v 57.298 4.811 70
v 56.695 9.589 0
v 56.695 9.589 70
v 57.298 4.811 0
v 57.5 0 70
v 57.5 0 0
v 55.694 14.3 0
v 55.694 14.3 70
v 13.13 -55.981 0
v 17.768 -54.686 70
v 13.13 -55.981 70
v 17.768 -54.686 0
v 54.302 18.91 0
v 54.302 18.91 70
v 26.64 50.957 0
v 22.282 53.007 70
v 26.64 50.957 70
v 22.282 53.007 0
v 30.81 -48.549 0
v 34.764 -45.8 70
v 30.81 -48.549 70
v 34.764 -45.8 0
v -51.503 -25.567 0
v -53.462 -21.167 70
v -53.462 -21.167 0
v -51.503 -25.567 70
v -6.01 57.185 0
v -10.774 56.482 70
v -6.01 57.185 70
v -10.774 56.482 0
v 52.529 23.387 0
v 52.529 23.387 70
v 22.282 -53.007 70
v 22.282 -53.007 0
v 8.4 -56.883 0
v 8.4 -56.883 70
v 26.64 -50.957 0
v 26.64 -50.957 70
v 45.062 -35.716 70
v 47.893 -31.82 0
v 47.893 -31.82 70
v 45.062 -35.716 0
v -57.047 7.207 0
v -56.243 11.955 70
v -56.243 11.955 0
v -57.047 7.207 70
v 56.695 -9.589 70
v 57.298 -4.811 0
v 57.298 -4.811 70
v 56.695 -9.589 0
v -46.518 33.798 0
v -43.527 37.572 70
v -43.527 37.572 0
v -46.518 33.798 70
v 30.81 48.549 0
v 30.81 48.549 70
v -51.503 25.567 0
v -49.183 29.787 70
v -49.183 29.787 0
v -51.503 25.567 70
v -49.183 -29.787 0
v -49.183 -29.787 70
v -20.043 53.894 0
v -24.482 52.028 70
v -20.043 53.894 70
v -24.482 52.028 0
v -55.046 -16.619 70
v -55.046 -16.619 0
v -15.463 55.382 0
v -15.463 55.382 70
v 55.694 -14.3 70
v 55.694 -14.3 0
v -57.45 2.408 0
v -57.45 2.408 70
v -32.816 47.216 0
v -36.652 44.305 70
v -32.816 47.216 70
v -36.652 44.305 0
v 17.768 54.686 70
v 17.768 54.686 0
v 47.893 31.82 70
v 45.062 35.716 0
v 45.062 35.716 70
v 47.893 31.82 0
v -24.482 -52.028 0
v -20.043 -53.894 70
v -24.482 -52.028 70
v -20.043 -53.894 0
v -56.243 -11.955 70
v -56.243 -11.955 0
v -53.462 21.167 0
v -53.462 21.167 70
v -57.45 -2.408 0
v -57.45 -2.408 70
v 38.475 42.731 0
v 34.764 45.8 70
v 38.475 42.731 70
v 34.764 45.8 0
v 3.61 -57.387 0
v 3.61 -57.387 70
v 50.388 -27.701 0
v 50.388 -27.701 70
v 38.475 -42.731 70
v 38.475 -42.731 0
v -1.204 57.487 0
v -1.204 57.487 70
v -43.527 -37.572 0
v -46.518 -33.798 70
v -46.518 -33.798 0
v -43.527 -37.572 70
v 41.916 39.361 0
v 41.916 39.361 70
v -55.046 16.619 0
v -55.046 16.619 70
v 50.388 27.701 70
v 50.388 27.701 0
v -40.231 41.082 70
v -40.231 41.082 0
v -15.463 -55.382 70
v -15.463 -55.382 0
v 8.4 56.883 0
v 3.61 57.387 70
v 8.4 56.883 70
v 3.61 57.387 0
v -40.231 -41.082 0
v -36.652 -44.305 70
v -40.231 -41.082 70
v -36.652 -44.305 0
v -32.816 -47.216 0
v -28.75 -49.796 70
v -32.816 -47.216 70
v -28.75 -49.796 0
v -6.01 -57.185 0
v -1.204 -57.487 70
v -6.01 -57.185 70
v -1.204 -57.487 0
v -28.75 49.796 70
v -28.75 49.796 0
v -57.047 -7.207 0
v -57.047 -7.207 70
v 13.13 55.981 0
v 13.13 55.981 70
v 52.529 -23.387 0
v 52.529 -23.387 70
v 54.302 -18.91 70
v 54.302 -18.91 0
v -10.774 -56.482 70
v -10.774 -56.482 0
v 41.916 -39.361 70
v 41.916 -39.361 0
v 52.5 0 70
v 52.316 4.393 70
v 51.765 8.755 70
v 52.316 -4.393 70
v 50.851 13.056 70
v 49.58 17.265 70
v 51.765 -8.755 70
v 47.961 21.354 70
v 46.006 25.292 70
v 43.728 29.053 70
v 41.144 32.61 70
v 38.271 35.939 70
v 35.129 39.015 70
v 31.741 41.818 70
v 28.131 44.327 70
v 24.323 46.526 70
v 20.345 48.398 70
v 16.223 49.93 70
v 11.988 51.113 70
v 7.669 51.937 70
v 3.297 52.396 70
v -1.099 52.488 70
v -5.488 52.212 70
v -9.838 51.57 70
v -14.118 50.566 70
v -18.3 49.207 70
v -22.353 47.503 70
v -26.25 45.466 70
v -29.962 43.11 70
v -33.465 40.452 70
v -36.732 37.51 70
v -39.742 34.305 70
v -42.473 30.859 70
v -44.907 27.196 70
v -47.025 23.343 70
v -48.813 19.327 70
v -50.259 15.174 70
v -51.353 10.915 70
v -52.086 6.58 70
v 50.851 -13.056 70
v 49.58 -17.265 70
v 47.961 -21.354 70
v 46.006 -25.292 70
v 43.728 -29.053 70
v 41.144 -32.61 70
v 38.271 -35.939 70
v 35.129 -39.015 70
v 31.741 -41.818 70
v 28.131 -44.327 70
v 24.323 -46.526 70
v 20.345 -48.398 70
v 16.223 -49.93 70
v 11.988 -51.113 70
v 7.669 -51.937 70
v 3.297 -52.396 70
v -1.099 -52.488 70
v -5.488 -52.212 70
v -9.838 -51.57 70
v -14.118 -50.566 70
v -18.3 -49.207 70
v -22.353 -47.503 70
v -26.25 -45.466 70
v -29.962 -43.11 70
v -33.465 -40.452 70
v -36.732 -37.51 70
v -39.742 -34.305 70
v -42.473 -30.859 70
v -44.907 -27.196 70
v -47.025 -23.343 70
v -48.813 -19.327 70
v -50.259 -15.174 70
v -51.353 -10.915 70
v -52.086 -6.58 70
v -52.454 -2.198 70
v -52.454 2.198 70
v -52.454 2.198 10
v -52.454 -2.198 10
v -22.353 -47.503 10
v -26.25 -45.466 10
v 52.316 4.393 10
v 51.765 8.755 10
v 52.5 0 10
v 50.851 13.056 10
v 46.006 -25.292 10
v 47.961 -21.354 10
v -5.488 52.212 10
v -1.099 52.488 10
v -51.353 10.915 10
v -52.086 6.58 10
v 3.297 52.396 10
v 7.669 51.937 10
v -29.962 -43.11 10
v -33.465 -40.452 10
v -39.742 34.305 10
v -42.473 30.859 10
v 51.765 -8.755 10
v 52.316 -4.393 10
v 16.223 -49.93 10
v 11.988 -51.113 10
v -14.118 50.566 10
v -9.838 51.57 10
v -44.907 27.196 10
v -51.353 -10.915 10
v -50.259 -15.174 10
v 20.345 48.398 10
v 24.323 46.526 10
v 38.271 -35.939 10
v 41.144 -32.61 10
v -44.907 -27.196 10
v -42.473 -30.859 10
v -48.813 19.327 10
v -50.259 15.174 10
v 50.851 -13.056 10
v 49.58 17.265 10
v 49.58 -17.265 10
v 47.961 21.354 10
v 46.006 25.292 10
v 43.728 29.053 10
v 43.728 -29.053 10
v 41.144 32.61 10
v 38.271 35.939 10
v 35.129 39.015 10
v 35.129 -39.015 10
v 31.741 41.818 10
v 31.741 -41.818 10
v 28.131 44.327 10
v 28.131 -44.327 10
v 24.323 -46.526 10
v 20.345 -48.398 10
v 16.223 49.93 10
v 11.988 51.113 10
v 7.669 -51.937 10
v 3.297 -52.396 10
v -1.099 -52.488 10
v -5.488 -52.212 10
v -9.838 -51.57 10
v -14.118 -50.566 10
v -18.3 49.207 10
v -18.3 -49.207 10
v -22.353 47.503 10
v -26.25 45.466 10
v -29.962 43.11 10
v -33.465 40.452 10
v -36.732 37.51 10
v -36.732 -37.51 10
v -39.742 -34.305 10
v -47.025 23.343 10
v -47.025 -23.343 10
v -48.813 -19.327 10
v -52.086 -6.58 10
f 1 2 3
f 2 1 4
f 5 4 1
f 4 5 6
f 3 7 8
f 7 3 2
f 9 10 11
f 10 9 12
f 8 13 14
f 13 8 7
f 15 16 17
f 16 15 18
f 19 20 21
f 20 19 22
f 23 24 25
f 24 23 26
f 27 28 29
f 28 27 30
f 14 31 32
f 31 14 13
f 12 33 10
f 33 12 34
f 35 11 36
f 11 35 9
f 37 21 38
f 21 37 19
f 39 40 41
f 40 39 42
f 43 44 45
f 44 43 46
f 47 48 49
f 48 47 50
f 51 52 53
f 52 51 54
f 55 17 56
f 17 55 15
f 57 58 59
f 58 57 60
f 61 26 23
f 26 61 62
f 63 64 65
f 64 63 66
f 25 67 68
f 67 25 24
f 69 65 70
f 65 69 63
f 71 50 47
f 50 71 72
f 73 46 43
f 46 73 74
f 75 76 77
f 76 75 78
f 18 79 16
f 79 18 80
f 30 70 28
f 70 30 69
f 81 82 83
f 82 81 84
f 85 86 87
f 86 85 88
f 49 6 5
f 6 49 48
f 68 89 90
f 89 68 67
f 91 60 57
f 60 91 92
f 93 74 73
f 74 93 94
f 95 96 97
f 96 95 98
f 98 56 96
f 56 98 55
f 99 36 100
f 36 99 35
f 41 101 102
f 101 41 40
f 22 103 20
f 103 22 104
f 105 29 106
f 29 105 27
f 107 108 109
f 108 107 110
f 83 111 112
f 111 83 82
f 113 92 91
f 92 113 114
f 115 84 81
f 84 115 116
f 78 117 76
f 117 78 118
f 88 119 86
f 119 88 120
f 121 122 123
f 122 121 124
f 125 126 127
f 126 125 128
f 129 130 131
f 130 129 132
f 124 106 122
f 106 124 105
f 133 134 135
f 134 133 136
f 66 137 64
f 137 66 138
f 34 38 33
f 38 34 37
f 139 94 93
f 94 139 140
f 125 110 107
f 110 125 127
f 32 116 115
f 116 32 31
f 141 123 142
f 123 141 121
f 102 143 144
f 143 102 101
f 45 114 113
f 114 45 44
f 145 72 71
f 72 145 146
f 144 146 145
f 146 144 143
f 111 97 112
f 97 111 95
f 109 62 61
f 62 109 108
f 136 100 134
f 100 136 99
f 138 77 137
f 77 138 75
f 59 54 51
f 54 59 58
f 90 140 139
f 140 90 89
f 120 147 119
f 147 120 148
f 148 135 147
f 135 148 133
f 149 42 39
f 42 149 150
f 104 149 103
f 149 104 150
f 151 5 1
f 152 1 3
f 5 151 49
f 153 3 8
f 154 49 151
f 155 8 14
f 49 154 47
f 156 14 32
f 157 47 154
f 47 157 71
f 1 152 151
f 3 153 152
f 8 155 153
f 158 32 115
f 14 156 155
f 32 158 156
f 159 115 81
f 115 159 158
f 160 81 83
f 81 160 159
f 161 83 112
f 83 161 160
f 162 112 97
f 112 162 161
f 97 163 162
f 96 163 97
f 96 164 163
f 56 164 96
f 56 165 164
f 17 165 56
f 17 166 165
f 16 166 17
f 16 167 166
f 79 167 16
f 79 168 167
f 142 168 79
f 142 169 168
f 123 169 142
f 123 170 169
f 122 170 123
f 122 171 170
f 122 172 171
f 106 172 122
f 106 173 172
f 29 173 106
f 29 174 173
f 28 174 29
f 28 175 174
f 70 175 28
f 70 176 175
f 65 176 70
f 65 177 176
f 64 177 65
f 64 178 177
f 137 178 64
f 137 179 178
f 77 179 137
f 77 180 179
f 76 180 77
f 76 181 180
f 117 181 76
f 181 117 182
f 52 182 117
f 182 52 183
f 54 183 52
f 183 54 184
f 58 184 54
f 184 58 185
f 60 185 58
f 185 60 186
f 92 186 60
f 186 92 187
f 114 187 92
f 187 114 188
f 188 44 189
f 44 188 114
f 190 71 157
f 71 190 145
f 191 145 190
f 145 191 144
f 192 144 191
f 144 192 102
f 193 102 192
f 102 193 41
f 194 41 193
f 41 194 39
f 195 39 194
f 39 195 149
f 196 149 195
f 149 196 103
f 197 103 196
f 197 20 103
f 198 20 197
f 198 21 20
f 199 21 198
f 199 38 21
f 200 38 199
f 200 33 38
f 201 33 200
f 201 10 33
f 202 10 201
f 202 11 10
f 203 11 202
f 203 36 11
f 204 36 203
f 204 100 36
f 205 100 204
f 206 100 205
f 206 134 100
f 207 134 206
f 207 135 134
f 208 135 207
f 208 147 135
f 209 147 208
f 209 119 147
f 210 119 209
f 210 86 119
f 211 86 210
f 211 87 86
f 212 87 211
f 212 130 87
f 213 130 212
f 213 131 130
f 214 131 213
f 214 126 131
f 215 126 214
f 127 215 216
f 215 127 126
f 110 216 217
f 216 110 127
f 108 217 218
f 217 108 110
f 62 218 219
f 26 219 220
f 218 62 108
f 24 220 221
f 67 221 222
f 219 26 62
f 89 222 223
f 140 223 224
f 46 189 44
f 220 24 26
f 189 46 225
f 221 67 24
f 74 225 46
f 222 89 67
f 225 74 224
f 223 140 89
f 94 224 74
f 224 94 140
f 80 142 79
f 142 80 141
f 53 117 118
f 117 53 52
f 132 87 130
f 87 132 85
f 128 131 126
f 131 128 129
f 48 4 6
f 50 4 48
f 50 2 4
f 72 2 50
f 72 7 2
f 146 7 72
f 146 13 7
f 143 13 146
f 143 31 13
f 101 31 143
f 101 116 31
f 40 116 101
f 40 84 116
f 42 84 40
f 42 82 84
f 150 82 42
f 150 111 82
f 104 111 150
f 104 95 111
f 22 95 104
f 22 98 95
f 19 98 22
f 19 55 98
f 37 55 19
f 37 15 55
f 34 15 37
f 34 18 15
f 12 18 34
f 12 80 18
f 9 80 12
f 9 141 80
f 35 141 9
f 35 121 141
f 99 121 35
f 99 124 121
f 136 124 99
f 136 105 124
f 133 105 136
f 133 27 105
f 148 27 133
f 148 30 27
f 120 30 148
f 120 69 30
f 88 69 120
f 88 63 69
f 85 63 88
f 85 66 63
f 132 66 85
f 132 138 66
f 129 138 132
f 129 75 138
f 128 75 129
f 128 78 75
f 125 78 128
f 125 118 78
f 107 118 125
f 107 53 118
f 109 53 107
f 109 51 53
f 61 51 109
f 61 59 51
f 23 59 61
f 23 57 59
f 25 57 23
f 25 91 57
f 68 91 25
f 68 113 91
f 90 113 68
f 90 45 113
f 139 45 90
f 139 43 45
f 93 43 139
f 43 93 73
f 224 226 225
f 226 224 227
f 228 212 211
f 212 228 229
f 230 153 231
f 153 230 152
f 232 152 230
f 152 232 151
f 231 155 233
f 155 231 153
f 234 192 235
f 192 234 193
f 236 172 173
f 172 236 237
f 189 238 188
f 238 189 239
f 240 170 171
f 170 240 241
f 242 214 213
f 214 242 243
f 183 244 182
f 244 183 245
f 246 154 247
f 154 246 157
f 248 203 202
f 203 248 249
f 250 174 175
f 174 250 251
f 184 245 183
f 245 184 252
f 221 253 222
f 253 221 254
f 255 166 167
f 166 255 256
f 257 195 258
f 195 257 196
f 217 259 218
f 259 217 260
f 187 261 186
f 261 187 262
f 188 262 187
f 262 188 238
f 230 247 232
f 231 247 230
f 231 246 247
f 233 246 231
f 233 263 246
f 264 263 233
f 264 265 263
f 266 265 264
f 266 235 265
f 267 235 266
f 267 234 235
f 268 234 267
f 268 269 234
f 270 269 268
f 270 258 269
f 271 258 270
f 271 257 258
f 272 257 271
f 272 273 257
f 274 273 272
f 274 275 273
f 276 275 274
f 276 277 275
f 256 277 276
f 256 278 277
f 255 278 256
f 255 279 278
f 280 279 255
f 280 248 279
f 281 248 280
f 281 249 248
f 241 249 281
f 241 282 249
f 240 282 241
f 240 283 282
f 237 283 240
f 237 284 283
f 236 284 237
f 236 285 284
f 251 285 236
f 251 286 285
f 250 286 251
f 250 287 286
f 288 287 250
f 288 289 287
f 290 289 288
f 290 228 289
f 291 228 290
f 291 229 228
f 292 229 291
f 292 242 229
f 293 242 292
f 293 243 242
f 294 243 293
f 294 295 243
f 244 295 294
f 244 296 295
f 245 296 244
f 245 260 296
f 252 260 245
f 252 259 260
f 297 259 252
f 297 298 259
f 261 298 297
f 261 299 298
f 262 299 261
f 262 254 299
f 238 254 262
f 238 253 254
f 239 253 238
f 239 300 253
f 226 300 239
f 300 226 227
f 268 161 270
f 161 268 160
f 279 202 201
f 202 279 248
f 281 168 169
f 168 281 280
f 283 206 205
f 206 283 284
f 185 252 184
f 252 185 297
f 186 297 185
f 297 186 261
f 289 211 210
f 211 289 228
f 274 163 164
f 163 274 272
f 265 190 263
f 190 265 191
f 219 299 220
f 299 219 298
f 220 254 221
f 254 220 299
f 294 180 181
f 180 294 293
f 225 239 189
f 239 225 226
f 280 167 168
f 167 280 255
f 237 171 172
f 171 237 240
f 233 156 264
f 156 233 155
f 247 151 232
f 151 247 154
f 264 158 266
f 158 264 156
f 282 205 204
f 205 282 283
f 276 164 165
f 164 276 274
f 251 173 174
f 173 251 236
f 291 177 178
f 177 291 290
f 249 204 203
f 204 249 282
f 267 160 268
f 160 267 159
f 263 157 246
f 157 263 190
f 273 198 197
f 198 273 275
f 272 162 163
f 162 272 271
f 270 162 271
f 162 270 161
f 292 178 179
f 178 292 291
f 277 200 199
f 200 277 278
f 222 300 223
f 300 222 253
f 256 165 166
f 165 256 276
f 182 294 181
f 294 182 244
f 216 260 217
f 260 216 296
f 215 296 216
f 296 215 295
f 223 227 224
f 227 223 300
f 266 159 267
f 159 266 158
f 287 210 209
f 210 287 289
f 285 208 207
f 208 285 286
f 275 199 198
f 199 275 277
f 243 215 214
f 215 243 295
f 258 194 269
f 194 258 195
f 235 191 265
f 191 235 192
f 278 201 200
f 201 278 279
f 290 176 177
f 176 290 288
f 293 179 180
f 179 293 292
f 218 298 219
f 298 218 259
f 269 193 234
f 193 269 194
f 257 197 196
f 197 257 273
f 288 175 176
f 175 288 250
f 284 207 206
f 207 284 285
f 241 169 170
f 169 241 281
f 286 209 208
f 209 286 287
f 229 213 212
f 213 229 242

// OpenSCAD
$fn=75;
internal_width = 105;
height = 70;
wall_width = 5;
bottom_thickness = 10;

difference() {
    cylinder(h=height, r=internal_width/2 + wall_width);
    translate([0, 0, bottom_thickness])
        cylinder(h=height, r=internal_width/2); 
};
